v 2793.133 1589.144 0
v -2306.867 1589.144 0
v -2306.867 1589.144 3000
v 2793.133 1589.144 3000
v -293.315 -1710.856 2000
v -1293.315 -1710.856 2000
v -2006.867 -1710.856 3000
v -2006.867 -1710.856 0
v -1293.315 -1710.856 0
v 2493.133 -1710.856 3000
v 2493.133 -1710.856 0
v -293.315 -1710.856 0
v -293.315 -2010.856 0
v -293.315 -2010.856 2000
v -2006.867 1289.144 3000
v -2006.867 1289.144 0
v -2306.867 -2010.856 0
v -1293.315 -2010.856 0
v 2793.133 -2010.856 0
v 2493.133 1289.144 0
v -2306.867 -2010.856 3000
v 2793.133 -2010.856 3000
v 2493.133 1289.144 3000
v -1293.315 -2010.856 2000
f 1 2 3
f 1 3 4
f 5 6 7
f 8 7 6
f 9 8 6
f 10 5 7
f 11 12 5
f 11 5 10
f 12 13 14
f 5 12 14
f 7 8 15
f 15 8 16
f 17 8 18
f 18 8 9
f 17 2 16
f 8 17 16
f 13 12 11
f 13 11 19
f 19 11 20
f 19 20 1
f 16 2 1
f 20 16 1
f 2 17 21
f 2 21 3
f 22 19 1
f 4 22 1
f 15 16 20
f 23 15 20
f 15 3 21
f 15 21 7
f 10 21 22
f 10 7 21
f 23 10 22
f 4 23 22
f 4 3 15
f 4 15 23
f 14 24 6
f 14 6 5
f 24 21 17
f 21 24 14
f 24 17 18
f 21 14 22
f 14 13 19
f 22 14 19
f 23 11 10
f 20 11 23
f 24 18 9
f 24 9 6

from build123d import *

# Parameters (mm, degrees)
F0_W     = 5100
F0_H     = 3600
F0_W_2   = 4500
F0_H_2   = 3000
F1_DEPTH = 3000
F2_W     = 1000
F2_H     = 2000
F3_DEPTH = 300


with BuildPart() as f1:
    # F0 (on Top) → F1 (new body)
    with BuildSketch(Plane.XY):
        with Locations((243.133116, -210.855583)):
            Rectangle(F0_W, F0_H)
        with Locations((243.133116, -210.855583)):
            Rectangle(F0_W_2, F0_H_2, mode=Mode.SUBTRACT)
    extrude(amount=F1_DEPTH)

    # F2 (on face) → F3 (cut, through all)
    with BuildSketch(Plane.XZ.offset(2010.855583)):
        with Locations((-793.314934, 1000)):
            Rectangle(F2_W, F2_H)
    extrude(amount=-F3_DEPTH, mode=Mode.SUBTRACT)


solid = f1.part
